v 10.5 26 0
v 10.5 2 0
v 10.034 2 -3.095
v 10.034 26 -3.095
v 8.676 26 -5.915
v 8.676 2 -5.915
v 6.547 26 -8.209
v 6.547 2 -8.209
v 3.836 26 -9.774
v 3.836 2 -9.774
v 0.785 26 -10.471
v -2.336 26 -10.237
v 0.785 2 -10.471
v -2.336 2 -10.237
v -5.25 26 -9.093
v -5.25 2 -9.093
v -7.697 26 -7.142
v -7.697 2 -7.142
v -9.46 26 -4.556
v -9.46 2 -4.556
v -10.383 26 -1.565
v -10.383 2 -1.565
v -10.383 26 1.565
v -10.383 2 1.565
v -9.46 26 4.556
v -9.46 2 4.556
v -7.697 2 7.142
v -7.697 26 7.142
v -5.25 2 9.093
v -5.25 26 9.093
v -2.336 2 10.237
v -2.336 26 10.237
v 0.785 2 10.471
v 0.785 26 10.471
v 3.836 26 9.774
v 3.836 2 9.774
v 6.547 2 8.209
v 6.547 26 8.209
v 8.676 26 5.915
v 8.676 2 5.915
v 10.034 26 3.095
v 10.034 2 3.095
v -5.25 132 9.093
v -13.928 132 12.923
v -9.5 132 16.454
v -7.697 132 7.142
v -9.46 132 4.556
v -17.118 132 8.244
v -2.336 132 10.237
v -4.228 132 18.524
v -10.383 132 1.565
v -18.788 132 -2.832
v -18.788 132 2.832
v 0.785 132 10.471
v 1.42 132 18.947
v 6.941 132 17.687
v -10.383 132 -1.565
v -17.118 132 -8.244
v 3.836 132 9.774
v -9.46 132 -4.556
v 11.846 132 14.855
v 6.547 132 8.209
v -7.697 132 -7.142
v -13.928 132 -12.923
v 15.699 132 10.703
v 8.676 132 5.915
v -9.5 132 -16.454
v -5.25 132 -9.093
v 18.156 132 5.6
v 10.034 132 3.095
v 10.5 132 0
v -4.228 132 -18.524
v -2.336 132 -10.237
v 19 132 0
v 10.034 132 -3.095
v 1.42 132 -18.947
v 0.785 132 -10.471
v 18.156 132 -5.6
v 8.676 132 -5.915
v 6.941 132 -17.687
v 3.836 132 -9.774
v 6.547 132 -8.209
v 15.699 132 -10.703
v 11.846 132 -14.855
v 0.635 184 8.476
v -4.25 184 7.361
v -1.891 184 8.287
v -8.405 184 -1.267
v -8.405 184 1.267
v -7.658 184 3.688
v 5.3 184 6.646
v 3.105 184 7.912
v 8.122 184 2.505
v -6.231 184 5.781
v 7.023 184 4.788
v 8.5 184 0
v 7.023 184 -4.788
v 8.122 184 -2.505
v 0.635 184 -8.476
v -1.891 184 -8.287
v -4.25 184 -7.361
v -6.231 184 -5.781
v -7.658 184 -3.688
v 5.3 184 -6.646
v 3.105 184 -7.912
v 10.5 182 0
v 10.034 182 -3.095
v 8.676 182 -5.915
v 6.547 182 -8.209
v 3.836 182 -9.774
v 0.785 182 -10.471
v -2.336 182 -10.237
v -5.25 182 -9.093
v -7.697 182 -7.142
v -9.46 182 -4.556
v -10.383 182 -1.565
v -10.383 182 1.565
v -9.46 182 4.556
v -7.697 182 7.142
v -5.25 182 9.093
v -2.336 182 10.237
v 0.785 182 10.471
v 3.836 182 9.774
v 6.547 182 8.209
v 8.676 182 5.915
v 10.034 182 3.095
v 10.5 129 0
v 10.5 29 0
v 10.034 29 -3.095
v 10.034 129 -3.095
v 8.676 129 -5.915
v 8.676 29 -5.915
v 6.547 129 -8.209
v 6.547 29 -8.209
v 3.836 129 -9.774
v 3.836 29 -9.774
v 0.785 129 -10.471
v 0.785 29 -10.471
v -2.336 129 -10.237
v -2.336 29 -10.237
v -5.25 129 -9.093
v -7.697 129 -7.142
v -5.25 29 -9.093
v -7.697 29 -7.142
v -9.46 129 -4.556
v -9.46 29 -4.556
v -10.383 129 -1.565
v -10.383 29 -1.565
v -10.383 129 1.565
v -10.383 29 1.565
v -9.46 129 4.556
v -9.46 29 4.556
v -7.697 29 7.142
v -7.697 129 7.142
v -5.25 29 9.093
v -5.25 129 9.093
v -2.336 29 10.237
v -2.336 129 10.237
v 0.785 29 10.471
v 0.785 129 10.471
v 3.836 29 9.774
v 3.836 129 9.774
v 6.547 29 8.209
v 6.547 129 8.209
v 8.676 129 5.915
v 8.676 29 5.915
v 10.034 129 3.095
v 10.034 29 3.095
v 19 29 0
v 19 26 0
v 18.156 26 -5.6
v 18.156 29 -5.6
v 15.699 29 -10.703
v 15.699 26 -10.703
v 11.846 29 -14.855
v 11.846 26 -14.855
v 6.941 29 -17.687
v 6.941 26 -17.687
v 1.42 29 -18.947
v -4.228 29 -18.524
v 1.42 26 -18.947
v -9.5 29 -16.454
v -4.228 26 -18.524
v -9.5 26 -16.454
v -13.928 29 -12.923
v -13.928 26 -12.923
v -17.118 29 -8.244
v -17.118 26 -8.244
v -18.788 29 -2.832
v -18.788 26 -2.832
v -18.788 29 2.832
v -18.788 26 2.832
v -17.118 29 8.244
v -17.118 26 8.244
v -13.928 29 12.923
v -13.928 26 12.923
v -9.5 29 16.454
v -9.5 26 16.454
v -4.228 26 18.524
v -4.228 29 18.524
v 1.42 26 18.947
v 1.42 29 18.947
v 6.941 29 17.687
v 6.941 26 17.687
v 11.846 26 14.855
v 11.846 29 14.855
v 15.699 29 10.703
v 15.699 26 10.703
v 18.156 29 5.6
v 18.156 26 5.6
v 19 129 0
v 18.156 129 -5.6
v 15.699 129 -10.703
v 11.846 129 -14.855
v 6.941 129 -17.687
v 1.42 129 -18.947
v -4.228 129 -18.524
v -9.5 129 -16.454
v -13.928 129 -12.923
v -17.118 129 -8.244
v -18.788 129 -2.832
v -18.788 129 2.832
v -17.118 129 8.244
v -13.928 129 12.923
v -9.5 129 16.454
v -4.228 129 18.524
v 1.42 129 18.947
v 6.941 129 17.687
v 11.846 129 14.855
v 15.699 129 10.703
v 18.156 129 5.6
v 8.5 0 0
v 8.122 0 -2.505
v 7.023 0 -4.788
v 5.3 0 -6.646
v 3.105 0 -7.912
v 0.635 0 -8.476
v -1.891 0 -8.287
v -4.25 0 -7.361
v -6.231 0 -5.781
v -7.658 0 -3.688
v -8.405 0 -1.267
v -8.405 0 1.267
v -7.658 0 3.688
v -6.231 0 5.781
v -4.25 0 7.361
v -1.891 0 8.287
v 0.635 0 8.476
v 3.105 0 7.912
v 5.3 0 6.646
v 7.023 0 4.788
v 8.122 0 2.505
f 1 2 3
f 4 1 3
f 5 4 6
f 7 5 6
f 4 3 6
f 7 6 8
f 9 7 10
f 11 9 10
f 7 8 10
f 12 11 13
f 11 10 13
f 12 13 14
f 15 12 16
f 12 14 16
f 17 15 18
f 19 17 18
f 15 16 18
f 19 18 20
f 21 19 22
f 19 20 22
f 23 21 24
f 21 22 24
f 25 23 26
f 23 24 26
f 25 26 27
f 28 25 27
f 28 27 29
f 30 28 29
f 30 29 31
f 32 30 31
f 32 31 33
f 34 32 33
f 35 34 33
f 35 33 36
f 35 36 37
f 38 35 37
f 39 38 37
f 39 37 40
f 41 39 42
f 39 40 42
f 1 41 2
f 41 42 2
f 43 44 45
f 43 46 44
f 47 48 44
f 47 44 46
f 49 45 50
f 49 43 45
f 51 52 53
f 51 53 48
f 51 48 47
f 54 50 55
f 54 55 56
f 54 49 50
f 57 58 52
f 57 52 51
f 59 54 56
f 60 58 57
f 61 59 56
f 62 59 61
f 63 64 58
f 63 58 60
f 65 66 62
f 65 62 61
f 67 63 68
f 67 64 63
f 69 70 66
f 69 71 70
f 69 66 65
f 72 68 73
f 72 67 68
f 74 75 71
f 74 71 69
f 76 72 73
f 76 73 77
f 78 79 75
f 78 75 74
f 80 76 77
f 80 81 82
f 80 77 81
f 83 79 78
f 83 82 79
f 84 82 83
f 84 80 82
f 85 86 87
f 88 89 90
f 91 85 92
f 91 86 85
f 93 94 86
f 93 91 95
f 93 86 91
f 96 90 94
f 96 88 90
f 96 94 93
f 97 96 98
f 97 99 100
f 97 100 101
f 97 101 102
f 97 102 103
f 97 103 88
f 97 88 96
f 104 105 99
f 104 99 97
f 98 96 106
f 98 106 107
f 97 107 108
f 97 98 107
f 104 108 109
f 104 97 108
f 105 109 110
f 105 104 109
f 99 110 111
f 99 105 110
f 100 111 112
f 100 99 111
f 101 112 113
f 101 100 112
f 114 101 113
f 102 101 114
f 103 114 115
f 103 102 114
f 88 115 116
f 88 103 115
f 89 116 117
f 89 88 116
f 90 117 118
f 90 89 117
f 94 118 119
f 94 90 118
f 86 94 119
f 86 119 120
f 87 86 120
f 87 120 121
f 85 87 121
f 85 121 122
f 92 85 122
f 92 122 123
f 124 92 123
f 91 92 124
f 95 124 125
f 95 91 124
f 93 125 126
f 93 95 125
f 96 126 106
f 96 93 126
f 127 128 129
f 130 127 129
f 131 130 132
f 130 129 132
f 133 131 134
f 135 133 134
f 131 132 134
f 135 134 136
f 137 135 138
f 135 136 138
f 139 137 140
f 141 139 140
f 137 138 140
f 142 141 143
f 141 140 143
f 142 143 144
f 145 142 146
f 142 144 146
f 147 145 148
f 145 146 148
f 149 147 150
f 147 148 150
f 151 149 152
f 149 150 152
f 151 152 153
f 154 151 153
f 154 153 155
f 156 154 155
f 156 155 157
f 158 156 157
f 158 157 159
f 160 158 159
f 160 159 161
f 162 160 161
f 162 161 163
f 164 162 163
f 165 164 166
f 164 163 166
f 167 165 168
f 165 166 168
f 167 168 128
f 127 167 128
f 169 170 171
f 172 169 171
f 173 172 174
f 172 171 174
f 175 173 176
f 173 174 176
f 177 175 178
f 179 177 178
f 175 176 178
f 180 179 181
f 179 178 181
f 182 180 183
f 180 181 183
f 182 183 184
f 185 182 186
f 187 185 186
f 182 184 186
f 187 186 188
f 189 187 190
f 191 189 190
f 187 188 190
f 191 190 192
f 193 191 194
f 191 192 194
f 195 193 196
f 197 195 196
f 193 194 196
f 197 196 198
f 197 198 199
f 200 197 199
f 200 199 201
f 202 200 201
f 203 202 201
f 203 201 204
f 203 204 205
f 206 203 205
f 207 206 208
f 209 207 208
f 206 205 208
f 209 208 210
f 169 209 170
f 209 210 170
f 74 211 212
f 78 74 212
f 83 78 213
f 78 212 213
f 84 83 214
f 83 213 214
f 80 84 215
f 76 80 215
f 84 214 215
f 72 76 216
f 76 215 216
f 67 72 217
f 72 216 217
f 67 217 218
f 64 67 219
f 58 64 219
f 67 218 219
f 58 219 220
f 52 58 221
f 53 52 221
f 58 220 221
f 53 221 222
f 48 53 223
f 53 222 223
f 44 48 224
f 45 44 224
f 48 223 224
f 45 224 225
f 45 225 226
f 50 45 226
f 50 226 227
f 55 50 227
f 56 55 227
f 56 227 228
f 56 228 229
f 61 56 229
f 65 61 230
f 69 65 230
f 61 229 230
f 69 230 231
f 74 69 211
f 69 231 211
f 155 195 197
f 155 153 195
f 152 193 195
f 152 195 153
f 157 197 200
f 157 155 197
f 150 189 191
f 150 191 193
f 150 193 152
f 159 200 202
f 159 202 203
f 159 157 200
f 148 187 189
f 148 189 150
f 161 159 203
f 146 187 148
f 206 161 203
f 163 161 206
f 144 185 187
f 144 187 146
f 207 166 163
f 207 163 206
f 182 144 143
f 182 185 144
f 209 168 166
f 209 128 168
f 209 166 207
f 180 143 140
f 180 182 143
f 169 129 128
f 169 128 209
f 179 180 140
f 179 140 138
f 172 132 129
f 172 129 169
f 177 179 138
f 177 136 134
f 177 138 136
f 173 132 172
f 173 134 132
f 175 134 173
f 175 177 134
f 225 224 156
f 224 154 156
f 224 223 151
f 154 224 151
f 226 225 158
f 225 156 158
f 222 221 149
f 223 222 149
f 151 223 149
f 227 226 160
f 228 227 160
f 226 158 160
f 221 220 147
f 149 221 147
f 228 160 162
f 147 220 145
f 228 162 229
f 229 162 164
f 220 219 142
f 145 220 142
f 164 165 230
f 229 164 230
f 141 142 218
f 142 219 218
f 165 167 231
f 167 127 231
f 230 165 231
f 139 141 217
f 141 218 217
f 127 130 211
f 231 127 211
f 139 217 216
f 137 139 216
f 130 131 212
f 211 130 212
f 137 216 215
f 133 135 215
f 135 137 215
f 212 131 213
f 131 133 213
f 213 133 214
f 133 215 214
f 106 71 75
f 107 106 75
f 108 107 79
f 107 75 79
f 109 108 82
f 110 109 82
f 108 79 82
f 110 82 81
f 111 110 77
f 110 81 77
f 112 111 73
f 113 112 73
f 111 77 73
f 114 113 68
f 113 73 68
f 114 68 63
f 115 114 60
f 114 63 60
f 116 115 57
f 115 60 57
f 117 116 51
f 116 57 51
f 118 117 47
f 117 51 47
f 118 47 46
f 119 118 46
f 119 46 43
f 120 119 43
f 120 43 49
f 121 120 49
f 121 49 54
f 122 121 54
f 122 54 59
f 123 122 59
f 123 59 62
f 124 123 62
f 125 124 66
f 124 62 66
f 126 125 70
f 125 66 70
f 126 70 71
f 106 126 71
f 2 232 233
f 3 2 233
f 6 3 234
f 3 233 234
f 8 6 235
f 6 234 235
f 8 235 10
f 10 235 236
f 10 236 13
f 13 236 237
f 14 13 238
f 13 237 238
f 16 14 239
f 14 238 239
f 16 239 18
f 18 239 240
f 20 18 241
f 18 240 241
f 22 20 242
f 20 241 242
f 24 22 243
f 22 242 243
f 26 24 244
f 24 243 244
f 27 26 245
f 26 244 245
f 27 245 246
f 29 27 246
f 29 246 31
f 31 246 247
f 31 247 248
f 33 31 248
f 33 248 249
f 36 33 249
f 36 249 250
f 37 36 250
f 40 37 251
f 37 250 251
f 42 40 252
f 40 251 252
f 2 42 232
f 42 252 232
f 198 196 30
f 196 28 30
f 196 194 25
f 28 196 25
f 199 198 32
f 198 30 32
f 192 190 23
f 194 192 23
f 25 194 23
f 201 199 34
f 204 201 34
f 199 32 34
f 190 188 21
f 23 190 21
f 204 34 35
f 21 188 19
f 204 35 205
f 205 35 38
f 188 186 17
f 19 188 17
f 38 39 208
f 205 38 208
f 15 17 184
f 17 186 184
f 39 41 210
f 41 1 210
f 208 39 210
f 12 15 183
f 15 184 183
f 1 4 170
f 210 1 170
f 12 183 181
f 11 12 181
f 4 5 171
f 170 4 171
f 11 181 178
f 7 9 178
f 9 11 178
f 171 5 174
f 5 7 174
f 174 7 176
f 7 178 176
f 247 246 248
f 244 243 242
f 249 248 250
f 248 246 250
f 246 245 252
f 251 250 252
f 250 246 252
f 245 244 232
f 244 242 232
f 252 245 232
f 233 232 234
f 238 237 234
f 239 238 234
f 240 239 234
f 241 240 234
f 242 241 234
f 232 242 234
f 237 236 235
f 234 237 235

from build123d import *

# Parameters (mm, degrees)
SKETCH1_R           = 10.5
BOSS_EXTRUDE1_DEPTH = 26
BOSS_EXTRUDE2_START = 26
SKETCH1_3_R         = 19
BOSS_EXTRUDE2_DEPTH = 3
BOSS_EXTRUDE3_START = 29
SKETCH1_4_R         = 10.5
BOSS_EXTRUDE3_DEPTH = 100
BOSS_EXTRUDE4_START = 129
SKETCH1_5_R         = 19
BOSS_EXTRUDE4_DEPTH = 3
BOSS_EXTRUDE5_START = 132
SKETCH1_6_R         = 10.5
BOSS_EXTRUDE5_DEPTH = 52
CHAMFER1_SIZE       = 2


with BuildPart() as part:
    # Sketch1 → Boss-Extrude1 (new body)
    with BuildSketch(Plane(origin=(0, 0, 0), x_dir=(1, 0, 0), z_dir=(0, 1, 0))):
        Circle(SKETCH1_R)
    extrude(amount=BOSS_EXTRUDE1_DEPTH)

    # Sketch1<3> → Boss-Extrude2 (add)
    with BuildSketch(Plane(origin=(0, 0, 0), x_dir=(1, 0, 0), z_dir=(0, 1, 0)).offset(BOSS_EXTRUDE2_START)):
        Circle(SKETCH1_3_R)
    extrude(amount=BOSS_EXTRUDE2_DEPTH)

    # Sketch1<4> → Boss-Extrude3 (add)
    with BuildSketch(Plane(origin=(0, 0, 0), x_dir=(1, 0, 0), z_dir=(0, 1, 0)).offset(BOSS_EXTRUDE3_START)):
        Circle(SKETCH1_4_R)
    extrude(amount=BOSS_EXTRUDE3_DEPTH)

    # Sketch1<5> → Boss-Extrude4 (add)
    with BuildSketch(Plane(origin=(0, 0, 0), x_dir=(1, 0, 0), z_dir=(0, 1, 0)).offset(BOSS_EXTRUDE4_START)):
        Circle(SKETCH1_5_R)
    extrude(amount=BOSS_EXTRUDE4_DEPTH)

    # Sketch1<6> → Boss-Extrude5 (add)
    with BuildSketch(Plane(origin=(0, 0, 0), x_dir=(1, 0, 0), z_dir=(0, 1, 0)).offset(BOSS_EXTRUDE5_START)):
        Circle(SKETCH1_6_R)
    extrude(amount=BOSS_EXTRUDE5_DEPTH)

    # Chamfer1
    chamfer1_edges = [part.edges().sort_by_distance(p)[0] for p in [
        (-10.5, 184, 0),
        (-10.5, 0, 0),
    ]]
    chamfer(chamfer1_edges, length=CHAMFER1_SIZE)


solid = part.part
